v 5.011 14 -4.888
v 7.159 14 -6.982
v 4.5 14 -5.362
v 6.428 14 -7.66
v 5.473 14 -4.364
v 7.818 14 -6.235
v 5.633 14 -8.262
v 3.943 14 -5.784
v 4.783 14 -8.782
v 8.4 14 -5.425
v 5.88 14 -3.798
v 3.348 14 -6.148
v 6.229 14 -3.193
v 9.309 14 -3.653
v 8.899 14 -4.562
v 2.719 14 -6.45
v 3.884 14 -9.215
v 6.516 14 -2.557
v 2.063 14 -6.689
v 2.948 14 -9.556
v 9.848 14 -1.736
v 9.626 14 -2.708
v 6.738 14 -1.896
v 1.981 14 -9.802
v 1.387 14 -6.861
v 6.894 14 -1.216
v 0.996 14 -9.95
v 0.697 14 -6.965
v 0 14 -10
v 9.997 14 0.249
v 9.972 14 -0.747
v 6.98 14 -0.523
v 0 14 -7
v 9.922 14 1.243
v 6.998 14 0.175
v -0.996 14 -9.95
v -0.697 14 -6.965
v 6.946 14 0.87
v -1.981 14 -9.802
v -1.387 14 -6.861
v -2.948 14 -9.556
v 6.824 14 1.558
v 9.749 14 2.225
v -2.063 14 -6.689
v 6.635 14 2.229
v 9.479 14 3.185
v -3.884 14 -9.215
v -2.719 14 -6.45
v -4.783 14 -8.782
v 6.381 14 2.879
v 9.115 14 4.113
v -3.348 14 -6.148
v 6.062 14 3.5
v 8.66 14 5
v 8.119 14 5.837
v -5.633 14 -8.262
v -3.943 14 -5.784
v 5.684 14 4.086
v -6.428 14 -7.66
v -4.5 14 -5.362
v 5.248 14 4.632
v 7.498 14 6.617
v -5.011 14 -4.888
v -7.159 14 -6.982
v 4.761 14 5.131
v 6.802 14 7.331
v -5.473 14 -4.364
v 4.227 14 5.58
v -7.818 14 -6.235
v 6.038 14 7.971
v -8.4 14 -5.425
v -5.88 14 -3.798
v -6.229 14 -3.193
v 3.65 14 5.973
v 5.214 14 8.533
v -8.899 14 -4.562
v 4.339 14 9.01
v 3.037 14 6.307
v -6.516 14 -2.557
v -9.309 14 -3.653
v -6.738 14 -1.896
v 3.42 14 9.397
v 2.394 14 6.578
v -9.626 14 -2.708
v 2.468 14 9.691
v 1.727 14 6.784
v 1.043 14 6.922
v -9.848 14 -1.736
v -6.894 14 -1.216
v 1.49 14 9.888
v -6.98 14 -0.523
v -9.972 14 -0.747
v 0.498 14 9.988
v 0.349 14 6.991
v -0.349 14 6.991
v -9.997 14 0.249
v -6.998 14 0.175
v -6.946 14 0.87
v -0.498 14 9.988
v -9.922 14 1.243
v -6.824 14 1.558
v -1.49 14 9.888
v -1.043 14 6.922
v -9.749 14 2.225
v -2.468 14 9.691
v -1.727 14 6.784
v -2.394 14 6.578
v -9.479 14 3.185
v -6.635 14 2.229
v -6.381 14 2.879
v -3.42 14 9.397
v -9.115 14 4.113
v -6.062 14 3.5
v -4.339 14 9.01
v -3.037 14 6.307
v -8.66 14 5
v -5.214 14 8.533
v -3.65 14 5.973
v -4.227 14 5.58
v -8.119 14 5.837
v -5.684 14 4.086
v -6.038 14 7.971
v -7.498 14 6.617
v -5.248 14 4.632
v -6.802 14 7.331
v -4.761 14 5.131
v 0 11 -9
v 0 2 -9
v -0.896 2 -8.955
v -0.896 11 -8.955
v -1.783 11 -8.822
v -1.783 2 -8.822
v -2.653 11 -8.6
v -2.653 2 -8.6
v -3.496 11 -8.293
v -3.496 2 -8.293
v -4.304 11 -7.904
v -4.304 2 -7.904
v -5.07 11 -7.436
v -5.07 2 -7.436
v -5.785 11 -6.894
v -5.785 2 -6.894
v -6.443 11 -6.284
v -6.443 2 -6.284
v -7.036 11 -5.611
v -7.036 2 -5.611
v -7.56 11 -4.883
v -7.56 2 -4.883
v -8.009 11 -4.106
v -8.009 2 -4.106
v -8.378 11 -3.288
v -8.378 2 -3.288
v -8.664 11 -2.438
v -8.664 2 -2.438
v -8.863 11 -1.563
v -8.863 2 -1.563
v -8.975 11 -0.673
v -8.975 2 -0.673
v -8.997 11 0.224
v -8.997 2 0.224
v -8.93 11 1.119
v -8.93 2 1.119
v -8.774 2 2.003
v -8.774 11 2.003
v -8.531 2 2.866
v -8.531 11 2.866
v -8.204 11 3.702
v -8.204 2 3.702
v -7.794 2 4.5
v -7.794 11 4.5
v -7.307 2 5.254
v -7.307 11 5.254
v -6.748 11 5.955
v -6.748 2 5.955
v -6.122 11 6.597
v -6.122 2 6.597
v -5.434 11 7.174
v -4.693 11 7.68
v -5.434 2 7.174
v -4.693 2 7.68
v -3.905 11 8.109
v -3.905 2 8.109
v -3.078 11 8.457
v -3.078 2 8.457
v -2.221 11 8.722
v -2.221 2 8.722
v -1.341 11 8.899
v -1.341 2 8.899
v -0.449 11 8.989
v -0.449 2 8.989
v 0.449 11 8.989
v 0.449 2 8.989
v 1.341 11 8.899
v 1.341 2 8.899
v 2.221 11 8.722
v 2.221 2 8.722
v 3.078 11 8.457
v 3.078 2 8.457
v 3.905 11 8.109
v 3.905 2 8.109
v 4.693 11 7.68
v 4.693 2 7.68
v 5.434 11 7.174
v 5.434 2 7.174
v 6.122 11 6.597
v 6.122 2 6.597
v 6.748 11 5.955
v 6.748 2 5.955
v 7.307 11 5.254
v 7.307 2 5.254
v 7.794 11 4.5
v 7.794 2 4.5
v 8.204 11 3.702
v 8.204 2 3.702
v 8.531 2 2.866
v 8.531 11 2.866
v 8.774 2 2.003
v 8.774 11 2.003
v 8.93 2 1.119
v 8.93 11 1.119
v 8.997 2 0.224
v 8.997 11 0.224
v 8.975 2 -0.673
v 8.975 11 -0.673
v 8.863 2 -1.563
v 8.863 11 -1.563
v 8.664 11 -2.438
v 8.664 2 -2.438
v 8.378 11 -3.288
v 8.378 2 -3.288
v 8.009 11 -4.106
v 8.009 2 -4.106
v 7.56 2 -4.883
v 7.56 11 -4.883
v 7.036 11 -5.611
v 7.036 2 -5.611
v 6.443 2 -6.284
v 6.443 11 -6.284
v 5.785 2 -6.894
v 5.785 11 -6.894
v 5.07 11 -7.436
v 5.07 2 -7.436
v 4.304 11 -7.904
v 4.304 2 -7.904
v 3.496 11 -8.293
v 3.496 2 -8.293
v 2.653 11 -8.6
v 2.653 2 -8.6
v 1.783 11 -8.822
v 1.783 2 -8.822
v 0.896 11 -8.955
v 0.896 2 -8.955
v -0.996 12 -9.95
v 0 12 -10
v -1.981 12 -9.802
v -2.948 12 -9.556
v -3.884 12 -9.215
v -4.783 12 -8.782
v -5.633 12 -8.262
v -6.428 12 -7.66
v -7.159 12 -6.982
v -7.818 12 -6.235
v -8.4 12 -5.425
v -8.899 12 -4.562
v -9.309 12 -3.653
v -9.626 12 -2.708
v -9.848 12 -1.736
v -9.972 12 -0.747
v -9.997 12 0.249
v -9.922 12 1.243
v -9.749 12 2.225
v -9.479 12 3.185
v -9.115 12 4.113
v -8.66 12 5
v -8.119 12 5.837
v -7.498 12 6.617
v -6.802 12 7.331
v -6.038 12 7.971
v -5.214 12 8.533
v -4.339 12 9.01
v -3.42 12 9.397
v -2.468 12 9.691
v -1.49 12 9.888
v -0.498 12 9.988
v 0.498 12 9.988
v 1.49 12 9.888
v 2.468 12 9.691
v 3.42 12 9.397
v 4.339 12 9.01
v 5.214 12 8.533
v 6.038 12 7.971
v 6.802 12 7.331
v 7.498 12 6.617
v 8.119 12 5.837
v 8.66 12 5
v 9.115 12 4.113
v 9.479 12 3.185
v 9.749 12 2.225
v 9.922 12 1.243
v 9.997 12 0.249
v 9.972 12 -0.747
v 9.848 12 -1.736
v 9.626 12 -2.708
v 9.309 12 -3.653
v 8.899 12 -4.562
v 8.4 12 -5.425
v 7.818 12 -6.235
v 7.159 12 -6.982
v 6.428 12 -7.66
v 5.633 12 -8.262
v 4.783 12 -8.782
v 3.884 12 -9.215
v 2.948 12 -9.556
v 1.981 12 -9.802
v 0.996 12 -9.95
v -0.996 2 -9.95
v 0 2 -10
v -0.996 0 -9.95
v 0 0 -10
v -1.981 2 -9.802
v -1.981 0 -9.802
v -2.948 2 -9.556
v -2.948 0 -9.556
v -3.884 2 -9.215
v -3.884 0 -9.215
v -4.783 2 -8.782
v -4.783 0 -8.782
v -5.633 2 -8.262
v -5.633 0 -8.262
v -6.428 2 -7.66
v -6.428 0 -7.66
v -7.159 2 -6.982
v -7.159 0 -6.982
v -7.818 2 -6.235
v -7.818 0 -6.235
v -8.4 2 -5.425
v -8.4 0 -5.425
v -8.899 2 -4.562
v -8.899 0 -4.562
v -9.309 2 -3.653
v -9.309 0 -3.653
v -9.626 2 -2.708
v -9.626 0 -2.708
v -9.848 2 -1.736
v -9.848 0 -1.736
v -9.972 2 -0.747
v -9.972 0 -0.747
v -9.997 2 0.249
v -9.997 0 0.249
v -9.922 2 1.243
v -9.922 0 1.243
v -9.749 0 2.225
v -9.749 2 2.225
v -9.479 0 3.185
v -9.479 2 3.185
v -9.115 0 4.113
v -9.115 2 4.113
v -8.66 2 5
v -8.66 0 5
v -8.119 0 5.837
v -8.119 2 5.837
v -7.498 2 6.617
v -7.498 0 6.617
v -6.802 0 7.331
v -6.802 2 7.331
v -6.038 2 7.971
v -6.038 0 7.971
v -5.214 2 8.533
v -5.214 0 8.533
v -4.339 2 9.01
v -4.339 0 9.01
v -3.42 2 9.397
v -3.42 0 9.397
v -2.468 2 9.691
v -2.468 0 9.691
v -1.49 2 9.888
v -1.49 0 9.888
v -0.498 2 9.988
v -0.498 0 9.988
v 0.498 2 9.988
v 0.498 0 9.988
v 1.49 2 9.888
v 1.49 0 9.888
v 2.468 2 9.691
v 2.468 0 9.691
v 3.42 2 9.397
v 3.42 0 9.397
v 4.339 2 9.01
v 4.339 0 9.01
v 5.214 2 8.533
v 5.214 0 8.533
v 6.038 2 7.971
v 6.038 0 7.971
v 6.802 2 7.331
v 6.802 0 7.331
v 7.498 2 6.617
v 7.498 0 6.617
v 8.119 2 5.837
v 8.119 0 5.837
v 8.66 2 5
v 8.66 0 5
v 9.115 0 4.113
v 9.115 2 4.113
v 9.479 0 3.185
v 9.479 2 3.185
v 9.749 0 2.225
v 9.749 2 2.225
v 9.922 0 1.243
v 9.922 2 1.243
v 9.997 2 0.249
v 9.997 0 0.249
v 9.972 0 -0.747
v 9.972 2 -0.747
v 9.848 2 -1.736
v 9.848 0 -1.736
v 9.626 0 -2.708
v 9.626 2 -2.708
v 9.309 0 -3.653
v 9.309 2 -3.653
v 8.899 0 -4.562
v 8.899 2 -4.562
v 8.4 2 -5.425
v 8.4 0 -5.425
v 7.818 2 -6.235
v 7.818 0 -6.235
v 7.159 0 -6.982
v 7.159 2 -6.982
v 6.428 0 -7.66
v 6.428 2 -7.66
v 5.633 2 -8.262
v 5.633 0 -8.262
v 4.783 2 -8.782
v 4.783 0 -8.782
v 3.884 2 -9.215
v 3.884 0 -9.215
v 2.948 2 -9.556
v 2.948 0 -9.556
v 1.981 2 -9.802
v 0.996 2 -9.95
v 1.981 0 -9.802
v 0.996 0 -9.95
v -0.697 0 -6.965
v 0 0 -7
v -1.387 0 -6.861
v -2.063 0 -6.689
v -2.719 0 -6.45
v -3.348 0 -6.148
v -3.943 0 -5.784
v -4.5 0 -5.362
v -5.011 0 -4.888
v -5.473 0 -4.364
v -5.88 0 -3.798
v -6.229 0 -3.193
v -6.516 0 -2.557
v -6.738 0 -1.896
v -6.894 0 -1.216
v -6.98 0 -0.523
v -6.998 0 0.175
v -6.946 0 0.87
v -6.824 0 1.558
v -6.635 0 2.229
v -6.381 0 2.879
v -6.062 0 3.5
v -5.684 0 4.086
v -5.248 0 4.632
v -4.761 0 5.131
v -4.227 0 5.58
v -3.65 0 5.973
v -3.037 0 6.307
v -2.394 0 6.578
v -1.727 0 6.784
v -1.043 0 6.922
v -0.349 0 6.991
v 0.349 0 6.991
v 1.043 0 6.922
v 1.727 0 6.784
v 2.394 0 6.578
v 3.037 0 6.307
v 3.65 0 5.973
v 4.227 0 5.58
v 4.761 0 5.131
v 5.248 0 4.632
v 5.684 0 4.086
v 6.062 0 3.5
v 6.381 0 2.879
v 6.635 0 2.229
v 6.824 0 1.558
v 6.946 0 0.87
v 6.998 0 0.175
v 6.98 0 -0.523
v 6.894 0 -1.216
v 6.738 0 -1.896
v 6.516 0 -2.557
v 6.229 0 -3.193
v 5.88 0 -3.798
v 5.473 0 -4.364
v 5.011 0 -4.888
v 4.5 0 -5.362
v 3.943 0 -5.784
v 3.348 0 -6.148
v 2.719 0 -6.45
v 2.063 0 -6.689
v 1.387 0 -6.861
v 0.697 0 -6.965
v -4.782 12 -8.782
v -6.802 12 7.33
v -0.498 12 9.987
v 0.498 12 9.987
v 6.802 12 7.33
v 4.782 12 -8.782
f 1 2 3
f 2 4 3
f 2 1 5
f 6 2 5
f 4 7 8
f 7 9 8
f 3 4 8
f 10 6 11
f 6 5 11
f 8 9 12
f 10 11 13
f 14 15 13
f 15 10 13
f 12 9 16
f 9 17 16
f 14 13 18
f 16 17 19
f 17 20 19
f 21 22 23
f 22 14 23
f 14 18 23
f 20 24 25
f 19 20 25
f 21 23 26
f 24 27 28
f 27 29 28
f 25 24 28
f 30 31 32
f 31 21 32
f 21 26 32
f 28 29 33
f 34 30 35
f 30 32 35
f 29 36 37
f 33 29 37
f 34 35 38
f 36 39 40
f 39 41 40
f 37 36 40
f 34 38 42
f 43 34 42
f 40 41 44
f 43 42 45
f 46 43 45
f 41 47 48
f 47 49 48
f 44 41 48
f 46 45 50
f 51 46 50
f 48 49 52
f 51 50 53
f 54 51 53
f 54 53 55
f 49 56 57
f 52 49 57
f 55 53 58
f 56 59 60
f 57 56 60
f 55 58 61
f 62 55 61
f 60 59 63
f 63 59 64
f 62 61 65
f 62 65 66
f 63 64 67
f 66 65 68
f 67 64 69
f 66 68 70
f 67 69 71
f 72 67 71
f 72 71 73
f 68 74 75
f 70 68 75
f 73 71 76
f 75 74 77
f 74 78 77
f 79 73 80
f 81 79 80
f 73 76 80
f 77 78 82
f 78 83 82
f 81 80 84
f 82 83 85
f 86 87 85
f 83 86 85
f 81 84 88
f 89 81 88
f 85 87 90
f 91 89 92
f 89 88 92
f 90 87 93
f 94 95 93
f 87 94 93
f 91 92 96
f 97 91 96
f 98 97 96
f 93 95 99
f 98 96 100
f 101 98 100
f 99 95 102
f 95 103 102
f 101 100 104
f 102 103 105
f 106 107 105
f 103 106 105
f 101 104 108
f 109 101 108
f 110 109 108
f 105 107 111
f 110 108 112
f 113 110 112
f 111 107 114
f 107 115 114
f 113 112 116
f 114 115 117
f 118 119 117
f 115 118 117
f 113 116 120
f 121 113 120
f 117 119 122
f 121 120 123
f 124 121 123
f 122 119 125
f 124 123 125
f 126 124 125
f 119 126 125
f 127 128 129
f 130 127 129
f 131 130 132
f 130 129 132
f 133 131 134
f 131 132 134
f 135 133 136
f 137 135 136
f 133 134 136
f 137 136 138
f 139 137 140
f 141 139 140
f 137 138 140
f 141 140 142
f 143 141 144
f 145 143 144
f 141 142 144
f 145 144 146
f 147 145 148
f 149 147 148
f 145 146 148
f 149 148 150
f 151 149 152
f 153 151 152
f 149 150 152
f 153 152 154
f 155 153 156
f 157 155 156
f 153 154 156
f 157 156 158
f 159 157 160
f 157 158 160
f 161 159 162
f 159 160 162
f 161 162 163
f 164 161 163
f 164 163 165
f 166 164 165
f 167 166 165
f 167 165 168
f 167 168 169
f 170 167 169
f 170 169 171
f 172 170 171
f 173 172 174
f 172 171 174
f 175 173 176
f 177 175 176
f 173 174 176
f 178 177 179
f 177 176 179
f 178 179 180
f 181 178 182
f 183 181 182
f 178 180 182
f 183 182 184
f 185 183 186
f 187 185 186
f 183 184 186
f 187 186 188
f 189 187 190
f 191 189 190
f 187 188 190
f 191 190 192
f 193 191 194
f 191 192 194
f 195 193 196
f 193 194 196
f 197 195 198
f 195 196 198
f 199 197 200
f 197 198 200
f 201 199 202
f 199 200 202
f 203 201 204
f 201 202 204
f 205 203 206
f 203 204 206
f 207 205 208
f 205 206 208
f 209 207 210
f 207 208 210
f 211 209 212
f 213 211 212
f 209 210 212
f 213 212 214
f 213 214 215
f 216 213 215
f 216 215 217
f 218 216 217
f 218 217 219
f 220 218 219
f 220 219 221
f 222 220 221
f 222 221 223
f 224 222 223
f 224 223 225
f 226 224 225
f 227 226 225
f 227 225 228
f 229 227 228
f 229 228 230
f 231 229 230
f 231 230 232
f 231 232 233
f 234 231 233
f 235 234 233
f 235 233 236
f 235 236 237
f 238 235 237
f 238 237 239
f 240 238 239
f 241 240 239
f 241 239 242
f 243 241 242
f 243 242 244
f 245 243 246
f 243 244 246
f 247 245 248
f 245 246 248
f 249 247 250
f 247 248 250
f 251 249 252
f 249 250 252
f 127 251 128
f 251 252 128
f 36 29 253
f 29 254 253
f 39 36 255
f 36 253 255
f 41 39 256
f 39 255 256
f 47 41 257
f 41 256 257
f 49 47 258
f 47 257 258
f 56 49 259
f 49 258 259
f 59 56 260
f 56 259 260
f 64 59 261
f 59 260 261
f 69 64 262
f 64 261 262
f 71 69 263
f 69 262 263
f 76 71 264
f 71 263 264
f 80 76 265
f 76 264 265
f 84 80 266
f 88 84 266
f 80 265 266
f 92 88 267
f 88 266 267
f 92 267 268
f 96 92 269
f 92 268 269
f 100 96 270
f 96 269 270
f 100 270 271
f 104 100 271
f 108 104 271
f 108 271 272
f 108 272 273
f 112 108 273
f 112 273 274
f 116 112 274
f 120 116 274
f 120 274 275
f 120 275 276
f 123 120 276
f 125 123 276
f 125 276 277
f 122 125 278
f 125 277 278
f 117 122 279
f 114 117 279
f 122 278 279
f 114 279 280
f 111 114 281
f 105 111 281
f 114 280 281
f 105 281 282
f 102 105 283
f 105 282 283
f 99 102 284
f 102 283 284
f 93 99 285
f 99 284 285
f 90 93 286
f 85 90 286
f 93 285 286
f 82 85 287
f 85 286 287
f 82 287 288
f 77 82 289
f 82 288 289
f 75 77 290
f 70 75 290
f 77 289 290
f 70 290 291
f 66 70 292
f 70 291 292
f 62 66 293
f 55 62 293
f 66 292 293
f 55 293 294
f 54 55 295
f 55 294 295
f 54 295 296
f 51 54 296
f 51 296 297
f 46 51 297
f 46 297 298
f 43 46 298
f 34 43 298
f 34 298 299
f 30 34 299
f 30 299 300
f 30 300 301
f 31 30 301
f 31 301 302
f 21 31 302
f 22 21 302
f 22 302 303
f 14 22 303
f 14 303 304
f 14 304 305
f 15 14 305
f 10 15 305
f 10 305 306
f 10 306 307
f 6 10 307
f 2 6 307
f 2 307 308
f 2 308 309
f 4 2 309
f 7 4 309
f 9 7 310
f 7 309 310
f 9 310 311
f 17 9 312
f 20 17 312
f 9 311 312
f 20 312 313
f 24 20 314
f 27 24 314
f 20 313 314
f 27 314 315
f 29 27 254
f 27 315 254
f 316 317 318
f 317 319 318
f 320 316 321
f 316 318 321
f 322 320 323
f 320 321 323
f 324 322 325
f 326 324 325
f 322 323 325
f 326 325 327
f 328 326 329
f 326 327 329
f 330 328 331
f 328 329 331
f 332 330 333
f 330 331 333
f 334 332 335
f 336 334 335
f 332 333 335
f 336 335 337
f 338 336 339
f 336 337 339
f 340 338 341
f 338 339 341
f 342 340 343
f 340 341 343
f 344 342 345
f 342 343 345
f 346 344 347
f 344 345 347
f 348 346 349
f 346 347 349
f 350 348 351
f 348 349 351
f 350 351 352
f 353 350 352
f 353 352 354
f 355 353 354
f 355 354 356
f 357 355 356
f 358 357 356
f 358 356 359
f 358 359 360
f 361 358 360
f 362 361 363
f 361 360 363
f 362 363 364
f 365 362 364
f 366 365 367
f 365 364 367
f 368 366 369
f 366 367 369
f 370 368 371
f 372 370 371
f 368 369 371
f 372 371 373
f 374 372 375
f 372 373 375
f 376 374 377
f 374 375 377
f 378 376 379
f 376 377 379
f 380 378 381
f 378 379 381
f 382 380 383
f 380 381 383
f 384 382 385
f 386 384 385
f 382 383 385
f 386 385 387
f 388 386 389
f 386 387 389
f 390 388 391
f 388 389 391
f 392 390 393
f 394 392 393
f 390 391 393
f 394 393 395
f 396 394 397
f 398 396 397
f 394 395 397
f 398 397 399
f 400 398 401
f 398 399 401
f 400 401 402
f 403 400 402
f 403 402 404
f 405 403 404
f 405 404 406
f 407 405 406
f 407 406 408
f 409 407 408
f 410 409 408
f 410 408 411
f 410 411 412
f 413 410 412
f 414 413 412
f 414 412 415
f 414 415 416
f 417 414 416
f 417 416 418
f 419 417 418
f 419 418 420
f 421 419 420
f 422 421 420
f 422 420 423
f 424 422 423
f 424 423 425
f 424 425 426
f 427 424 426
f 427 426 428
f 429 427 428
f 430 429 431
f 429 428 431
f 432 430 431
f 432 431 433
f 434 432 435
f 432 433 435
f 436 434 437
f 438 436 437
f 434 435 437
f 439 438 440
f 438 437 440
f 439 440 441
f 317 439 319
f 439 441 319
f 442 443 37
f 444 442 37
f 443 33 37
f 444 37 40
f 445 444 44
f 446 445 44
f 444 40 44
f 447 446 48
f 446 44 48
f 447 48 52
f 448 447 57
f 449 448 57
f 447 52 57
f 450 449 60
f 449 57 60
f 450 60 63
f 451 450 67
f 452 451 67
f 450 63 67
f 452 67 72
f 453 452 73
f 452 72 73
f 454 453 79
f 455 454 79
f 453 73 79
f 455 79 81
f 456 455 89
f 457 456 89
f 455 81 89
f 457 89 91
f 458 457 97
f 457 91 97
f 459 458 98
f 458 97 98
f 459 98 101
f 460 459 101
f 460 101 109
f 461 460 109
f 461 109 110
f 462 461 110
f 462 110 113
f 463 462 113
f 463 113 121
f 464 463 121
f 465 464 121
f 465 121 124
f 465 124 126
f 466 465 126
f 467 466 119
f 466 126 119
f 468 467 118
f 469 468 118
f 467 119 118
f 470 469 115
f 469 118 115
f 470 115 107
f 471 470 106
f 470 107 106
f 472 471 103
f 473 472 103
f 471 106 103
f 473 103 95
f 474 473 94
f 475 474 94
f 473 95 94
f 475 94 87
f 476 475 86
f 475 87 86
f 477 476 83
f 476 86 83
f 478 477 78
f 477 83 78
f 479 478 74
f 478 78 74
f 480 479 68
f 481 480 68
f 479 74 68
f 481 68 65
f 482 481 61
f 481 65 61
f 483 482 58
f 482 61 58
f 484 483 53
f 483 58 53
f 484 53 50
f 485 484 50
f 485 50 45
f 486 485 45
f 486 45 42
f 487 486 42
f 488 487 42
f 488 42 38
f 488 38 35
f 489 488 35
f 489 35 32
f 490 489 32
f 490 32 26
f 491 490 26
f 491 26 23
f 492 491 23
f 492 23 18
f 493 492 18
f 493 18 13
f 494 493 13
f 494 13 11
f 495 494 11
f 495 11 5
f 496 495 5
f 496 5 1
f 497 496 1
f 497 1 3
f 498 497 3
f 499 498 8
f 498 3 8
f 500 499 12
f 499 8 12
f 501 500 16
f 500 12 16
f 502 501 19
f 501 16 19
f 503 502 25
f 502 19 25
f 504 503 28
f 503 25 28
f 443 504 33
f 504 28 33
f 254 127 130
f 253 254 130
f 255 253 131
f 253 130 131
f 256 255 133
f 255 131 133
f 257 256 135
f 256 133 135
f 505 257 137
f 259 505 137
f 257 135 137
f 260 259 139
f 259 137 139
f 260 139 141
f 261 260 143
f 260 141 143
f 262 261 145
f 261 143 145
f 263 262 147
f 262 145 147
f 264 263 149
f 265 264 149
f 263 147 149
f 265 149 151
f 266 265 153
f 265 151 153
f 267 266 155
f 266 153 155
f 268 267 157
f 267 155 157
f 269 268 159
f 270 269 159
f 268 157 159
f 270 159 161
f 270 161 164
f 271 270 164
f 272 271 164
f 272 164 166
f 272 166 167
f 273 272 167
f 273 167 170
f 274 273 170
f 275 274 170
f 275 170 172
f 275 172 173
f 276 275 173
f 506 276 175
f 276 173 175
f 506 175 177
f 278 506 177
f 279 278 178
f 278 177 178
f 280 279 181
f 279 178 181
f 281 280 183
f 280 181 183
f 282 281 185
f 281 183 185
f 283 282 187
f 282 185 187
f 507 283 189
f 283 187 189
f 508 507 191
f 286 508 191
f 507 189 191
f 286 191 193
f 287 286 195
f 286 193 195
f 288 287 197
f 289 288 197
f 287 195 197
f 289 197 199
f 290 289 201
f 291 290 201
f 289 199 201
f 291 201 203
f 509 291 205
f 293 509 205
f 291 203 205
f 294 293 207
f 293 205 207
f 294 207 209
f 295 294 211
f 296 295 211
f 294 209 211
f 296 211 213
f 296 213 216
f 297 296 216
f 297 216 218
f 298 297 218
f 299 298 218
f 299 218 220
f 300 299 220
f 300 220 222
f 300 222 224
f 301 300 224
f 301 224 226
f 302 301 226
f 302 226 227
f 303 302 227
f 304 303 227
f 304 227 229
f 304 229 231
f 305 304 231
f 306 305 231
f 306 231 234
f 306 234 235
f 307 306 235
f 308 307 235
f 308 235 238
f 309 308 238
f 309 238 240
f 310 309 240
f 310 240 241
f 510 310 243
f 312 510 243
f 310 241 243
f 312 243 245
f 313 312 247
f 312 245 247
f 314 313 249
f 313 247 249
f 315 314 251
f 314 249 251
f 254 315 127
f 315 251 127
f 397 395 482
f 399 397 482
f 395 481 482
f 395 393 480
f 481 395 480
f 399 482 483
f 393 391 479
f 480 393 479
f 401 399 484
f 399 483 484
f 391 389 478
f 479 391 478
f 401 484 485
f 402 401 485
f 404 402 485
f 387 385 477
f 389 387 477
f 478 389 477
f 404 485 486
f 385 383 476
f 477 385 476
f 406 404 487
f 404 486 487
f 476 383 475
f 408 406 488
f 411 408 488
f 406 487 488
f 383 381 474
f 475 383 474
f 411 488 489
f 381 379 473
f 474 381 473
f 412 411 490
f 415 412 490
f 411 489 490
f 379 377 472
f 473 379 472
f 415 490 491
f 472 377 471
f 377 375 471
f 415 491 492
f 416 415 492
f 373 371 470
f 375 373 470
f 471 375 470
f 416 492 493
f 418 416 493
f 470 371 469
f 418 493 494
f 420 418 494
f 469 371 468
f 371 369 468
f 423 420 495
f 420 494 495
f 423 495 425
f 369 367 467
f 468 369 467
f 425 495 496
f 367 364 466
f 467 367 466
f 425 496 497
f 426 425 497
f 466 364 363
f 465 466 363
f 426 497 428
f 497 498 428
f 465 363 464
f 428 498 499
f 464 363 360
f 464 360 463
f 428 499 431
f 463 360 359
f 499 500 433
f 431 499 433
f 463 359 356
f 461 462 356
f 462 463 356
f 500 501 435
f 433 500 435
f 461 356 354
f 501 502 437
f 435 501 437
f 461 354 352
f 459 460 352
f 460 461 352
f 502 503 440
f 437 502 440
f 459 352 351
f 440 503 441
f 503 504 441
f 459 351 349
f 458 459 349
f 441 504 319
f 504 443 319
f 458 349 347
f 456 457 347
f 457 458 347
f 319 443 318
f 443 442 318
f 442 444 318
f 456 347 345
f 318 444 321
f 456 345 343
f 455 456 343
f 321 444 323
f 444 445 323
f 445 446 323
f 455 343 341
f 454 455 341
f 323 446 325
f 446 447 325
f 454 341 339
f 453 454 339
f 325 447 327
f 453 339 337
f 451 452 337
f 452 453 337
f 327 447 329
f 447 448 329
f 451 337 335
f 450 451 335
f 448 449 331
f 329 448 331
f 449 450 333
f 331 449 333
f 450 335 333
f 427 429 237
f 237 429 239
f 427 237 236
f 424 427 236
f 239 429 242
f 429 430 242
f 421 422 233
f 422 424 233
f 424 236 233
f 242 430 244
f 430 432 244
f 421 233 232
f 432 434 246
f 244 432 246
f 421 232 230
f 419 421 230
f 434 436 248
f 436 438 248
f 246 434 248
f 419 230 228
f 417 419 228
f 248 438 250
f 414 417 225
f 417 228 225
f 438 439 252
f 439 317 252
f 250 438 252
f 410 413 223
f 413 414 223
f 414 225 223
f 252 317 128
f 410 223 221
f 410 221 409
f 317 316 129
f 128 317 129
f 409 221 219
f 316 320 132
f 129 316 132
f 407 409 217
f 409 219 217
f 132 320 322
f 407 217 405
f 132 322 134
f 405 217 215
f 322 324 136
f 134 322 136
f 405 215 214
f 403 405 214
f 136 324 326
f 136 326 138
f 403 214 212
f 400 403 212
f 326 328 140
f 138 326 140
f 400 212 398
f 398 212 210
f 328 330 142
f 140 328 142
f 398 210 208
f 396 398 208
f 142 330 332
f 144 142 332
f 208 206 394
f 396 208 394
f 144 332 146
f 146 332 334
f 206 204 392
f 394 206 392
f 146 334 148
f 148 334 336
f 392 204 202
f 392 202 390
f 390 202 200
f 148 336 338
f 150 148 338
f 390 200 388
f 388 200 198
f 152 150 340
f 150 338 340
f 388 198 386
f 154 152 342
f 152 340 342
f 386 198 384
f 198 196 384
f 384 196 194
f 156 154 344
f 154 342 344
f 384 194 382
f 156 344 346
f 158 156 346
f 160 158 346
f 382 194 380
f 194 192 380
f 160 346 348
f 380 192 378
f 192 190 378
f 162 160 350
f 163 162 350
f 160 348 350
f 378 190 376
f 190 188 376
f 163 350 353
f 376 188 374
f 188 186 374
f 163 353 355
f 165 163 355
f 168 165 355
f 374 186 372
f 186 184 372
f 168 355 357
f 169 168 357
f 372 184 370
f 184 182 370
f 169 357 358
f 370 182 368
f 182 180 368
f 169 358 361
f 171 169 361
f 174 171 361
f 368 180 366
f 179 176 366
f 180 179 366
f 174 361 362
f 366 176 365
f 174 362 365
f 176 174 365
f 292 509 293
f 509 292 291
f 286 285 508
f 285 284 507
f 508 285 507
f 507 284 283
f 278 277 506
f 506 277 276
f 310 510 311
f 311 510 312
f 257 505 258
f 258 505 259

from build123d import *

# Parameters (mm, degrees)
CHAMFER1_SIZE = 1


with BuildPart() as part:
    # Sketch1 → Revolve1 (revolve)
    with BuildSketch(Plane.XY, mode=Mode.PRIVATE) as revolve1_sk:
        Polygon((7, 0), (7, 14), (10, 14), (10, 12), (9, 12), (9, 2), (10, 2), (10, 0), align=None)
    revolve(revolve1_sk.sketch.rotate(Axis((0, 0.1, 0), (0, 1, 0)), 90), axis=Axis((0, 0.1, 0), (0, 1, 0)))

    # Chamfer1
    chamfer1_edges = [part.edges().sort_by_distance(p)[0] for p in [
        (0, 12, 9),
    ]]
    chamfer(chamfer1_edges, length=CHAMFER1_SIZE - 0.0001)  # a hair under: the kernel refuses the full size


solid = part.part
